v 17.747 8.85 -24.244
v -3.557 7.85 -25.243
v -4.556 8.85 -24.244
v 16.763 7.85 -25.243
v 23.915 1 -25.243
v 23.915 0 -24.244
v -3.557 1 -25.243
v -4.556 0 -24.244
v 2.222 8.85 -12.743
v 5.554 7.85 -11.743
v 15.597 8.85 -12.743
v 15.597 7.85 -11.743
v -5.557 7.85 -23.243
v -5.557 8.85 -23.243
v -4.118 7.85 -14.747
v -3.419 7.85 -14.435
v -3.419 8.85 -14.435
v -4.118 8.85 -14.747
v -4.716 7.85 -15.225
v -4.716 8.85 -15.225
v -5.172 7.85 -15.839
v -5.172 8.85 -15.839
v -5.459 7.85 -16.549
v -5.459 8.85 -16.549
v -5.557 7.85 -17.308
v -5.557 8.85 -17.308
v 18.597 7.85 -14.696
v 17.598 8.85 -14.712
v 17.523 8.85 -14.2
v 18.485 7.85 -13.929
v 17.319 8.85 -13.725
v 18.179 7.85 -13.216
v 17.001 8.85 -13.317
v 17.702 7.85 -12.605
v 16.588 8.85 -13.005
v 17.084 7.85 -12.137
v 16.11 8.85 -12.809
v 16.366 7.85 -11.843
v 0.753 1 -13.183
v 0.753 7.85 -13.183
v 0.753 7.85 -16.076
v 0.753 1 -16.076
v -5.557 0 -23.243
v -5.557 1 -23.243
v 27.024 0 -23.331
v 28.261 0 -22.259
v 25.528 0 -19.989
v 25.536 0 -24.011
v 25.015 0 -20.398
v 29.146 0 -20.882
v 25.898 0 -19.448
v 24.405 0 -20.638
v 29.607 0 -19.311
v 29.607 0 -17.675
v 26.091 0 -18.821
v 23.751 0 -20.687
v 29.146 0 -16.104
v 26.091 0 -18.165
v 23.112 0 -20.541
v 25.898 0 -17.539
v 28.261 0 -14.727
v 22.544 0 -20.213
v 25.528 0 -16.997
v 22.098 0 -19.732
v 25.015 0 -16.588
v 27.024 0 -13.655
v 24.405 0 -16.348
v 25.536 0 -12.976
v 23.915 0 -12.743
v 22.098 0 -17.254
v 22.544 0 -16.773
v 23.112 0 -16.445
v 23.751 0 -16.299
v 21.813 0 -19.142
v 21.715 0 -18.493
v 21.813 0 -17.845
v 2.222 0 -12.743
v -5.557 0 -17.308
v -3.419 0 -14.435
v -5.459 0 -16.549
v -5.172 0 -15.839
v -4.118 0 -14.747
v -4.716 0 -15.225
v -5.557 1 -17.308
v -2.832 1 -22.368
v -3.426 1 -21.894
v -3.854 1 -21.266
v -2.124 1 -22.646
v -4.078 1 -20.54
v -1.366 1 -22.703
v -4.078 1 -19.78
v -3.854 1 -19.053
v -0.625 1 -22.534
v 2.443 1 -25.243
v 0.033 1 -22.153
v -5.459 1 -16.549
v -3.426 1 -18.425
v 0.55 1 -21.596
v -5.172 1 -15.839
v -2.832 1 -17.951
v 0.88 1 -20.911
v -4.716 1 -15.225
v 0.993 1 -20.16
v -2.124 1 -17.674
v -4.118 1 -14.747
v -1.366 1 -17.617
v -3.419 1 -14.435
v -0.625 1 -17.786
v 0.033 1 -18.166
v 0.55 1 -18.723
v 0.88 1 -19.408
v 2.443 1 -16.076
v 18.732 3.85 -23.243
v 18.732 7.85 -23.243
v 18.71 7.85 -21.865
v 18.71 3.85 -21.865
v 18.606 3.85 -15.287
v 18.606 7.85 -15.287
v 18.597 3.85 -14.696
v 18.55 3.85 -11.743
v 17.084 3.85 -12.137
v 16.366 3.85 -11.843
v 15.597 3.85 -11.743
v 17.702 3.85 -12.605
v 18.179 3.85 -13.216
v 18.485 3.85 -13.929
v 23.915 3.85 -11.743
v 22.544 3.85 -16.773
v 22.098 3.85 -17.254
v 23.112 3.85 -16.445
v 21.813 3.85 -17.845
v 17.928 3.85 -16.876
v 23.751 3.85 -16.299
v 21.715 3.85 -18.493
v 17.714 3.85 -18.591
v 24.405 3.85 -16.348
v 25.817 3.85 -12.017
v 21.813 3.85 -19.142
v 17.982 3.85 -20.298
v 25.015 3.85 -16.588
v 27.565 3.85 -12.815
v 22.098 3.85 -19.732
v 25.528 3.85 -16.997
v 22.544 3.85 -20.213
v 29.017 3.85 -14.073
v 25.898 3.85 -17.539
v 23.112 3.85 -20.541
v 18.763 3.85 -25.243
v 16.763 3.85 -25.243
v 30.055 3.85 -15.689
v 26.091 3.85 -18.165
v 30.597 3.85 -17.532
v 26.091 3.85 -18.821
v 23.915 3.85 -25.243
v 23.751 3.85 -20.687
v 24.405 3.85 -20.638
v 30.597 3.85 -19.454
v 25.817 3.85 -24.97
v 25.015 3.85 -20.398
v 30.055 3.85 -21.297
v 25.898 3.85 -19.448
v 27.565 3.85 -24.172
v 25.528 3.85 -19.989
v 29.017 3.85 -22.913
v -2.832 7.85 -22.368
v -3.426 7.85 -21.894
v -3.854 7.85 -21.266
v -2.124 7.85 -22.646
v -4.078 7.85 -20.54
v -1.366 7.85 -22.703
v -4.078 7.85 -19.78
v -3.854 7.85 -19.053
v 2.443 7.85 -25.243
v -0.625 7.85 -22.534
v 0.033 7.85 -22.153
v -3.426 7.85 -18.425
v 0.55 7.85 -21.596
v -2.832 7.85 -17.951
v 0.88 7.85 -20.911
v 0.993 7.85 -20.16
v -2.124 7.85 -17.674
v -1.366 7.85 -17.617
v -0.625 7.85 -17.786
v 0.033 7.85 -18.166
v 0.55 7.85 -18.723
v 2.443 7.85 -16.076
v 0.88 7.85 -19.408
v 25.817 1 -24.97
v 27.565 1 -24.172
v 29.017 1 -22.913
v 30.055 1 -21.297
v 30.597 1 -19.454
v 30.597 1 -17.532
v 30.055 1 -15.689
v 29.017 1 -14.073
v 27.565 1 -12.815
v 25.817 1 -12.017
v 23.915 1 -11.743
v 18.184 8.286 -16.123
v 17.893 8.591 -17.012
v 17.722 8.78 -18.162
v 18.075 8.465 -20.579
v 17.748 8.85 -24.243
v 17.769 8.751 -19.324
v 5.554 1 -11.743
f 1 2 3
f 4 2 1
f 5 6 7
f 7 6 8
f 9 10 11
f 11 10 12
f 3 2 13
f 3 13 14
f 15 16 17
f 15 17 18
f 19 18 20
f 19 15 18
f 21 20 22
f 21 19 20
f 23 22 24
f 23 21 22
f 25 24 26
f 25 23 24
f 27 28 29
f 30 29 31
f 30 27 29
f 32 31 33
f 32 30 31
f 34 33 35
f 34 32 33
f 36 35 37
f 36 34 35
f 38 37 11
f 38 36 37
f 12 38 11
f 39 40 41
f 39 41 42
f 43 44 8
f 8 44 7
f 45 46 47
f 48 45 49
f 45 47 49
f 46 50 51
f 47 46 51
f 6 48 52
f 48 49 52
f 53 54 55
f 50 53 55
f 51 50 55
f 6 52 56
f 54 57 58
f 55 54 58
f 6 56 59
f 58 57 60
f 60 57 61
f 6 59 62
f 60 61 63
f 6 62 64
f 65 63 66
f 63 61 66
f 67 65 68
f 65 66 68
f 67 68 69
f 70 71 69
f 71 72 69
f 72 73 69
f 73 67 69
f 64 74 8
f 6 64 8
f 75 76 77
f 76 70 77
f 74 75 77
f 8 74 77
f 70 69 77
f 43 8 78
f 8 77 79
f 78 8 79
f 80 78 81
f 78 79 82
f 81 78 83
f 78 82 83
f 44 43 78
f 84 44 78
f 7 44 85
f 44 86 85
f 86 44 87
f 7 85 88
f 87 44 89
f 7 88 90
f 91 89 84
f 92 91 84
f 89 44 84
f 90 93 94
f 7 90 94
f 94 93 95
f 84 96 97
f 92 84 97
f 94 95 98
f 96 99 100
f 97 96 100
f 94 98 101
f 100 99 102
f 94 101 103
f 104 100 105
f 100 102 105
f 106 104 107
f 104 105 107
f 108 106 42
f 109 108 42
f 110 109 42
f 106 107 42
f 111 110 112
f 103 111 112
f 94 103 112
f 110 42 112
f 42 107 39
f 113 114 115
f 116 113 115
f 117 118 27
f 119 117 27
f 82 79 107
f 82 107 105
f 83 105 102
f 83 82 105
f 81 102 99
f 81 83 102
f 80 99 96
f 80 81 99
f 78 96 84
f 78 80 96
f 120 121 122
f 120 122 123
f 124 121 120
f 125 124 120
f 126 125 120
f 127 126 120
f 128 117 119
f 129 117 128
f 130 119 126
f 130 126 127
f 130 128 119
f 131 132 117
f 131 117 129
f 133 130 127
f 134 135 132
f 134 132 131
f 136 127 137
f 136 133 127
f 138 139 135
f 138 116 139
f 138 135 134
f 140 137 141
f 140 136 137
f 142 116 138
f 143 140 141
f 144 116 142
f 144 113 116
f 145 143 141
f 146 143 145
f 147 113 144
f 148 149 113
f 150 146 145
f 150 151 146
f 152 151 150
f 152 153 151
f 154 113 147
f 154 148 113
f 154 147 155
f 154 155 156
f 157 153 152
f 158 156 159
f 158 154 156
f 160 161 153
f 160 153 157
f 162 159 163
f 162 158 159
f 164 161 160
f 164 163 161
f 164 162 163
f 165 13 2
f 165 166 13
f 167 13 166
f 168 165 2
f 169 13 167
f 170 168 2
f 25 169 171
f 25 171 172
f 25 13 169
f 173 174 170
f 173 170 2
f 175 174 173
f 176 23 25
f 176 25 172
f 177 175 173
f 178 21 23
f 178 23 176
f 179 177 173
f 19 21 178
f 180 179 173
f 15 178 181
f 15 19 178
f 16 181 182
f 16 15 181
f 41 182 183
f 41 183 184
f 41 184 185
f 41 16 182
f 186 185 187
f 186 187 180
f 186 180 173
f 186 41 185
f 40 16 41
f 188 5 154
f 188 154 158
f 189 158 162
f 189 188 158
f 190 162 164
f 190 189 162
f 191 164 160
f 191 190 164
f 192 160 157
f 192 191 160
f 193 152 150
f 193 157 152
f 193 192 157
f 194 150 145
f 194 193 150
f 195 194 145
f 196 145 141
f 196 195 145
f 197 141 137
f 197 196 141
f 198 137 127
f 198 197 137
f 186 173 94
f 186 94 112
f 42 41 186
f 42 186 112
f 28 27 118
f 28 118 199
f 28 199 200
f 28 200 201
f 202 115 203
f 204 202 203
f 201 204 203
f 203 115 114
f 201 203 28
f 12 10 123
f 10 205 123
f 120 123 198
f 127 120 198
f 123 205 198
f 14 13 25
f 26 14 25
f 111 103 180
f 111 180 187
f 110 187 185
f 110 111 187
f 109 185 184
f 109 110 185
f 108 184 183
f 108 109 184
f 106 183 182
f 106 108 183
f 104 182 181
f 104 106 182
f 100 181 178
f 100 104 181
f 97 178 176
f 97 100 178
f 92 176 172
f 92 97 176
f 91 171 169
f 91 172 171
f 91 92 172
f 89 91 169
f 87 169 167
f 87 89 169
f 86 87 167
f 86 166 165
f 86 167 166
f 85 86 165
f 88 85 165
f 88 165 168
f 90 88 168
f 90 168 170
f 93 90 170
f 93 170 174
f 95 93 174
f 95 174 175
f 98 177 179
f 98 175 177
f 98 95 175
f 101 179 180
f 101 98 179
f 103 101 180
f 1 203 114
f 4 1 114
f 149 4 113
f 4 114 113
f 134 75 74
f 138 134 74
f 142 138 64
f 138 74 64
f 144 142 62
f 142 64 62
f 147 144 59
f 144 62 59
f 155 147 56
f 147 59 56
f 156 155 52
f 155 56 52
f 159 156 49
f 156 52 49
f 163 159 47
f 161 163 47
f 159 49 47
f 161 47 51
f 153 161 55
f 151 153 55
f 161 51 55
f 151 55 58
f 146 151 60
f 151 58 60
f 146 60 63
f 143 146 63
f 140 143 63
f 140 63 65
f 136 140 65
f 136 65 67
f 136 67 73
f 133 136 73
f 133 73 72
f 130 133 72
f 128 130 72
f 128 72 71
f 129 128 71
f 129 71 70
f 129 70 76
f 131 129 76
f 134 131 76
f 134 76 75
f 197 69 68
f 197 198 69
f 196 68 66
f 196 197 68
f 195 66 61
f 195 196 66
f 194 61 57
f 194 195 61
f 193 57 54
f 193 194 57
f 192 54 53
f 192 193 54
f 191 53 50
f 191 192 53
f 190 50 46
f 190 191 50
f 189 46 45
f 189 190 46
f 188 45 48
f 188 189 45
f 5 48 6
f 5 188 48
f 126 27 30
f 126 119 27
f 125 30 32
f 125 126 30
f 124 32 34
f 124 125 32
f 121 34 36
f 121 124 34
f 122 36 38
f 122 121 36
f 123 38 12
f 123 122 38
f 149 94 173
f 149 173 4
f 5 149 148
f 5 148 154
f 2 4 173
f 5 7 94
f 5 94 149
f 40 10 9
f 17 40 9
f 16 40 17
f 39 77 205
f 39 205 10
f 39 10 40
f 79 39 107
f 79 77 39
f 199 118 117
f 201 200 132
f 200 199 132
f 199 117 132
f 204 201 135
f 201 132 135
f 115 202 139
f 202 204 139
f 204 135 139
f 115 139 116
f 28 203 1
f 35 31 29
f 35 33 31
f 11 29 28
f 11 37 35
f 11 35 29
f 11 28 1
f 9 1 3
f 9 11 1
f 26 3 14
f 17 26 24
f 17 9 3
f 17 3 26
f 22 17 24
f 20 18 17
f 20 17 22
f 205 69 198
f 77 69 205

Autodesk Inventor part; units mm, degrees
ref_plane "YZ Plane" through (0, 0, 0) normal (1, 0, 0) x (0, 1, 0)
ref_plane "XZ Plane" through (0, 0, 0) normal (0, 1, 0) x (-1, 0, 0)
ref_plane "XY Plane" through (0, 0, 0) normal (0, 0, 1) x (1, 0, 0)
sketch "Sketch2" plane through (0, 0, 0) normal (0, 1, 0) x (-1, 0, 0)
  line L0 (-5.5536, -11.7431) -> (5.5568, -15.0764)
  line L1 (5.5568, -25.2431) -> (-23.9154, -25.2431)
  line L2 (-23.9154, -25.2431) -> (-23.9154, -11.7431)
  line L3 (-5.5536, -11.7431) -> (-23.9154, -11.7431)
  line L4 (5.5568, -25.2431) -> (5.5568, -15.0764)
  circle A0 centre (-23.9154, -18.4931) radius 6.75
  circle A1 centre (-23.9154, -18.4931) radius 2.2
  circle A2 centre (-23.9154, -18.4931) radius 6.202
  circle A3 centre (-24.9154, -18.9931) radius 6.25
  line L5 (-18.8553, -31.0955) -> (-18.419, -3.4058)
  point P0 (0, 0)
  point P1 (0, 0)
  point P2 (-19.4912, -10.8803)
  point P3 (-19.4912, -24.3803)
  point P4 (-23.9154, -12.2912)
  point P5 (-23.9154, -24.6951)
  dimension "d1" = 13.5
  dimension "d0" = 4.4
  dimension "d6" = 0.5
  dimension "d7" = 1
  dimension "d8" = 12.5
extrude "Extrusion1" add sketch "Sketch2" along normal blind 3.85 contours L0 L4 L1 L5 A0 L3 | L5 A0 L3 | A0 L5 A2 L2 | L2 A2 A3 A0 | A0 L5 A2 | L1 A0 L5 | A2 L5 A3 L2 | L2 A3 A2 | A3 A2 L2 A0 | L5 A2 A3 | A2 L5 | A0 A3 L2 | L2 A3 A2 L5 A0 | A3 A2 L2 A1 | L2 A1 A2 A3 | L2 A2 A3
extrude "Extrusion2" add sketch "Sketch2" along normal blind 8.85 contours L0 L4 L1 L5 A0 L3 | L5 A0 L3 | A0 L5 A2 L2 | A0 L5 A2 | L1 A0 L5 | L2 A3 A2 L5 A0 | L2 A2 A3 picked at (-23.6214, -24.9369)
sketch "Sketch3" plane through (0, 8.85, 0) normal (0, 1, 0) x (1, 0, 0)
  line L0 (-5.5568, 25.2431) -> (-5.5568, 15.0764) projected
  line L1 (-5.5568, 15.0764) -> (5.5536, 11.7431) projected
  line L2 (5.5536, 11.7431) -> (23.9154, 11.7431) projected
  line L3 (23.9154, 11.7431) -> (23.9154, 12.2912) projected
  arc A0 (23.9154, 24.6951) -> (23.9154, 12.2912) centre (23.9154, 18.4931) ccw projected
  line L4 (23.9154, 24.6951) -> (23.9154, 25.2431) projected
  line L5 (23.9154, 25.2431) -> (-5.5568, 25.2431) projected
  line L6 (18.8553, 31.0955) -> (18.419, 3.4058) projected
  point P0 (0, 0)
  point P1 (18.6062, 15.2873)
  point P2 (18.5504, 11.7431)
  point P3 (18.7631, 25.2431)
  point P4 (18.7099, 21.8646)
extrude "Extrusion3" cut sketch "Sketch3" against normal up to surface (5 mm away) contours L5 L4 A0 L6 | L6 A0 L3 L2
sketch "Sketch4" plane through (-5.5568, 0, -25.2431) normal (-1, 0, 0) x (0, 0, 1)
  line L0 (0, 0) -> (10.1667, 0) projected
  line L1 (10.1667, 0) -> (10.1667, 8.85) projected
  line L2 (0, 8.85) -> (10.1667, 8.85) projected
  line L3 (0, 0) -> (0, 8.85) projected
  line L4 (9.1667, 7.85) -> (9.1667, 1)
  line L5 (9.1667, 1) -> (1, 1)
  line L6 (1, 1) -> (1, 7.85)
  line L7 (1, 7.85) -> (9.1667, 7.85)
  point P0 (25.2431, 0)
  dimension "d11" = 1
extrude "Extrusion4" cut sketch "Sketch4" against normal blind 8 contours L4 L5 L6 L7
sketch "Sketch5" plane through (-5.5568, 1, -16.0764) normal (0, 1, 0) x (1, 0, 0)
  line L0 (0, 0) -> (0, 8.1667) projected
  line L1 (0, 0) -> (8, 0) projected
  line L2 (8, 0) -> (8, 8.1667) projected
  line L3 (0, 8.1667) -> (8, 8.1667) projected
  line L4 (8, 4.0834) -> (2.9855, 4.0834) construction
  line L5 (4, 0) -> (4, 4.0834) construction
  circle A0 centre (4, 4.0834) radius 2.55
  point P0 (5.5568, -16.0764)
  dimension "d14" = 5.1
extrude "Extrusion5" add sketch "Sketch5" along normal up to surface (6.85 mm away) contours A0
sketch "Sketch6" plane through (5.5536, 0, -11.7431) normal (0, 0, 1) x (1, 0, 0)
  line L0 (-11.1104, 7.85) -> (-11.1104, 1) projected
  line L1 (-11.1104, 7.85) -> (-4.8007, 7.85)
  line L2 (-4.8007, 7.85) -> (-4.8007, 1)
  line L3 (-11.1104, 1) -> (-4.8007, 1)
  point P0 (-5.5536, 0)
extrude "Extrusion6" cut sketch "Sketch6" against normal up to surface (4.3333 mm away)
sketch "Sketch7" plane through (-5.5568, 1, -24.2431) normal (0, 0, 1) x (1, 0, 0)
  line L0 (0, 0) -> (0, 6.85) projected
  line L1 (0, 0) -> (8, 0) projected
  line L2 (8, 0) -> (8, 6.85) projected
  line L3 (0, 6.85) -> (8, 6.85) projected
  point P0 (5.5568, -1)
extrude "Extrusion7" cut sketch "Sketch7" against normal blind 10.25
sketch "Sketch8" plane through (0, 8.85, 0) normal (0, 1, 0) x (1, 0, 0)
  circle A0 centre (-1.5568, 20.1598) radius 2.55 projected
  circle A1 centre (-1.5568, 20.1598) radius 2.55 projected
  line L0 (-5.5568, 25.2431) -> (2.4432, 25.2431) projected
  point P0 (0, 0)
fillet "Fillet1" radius 3 2 edges at (-5.5568, 8.35, -15.0764) (-5.5568, 0.5, -15.0764)
chamfer "Chamfer1" distance 2 angle 45 2 edges at (-5.5568, 8.35, -25.2431) (-5.5568, 0.5, -25.2431)
chamfer "Chamfer2" distance 2 angle 45 1 edges at (18.7631, 6.35, -25.2431)
fillet "Fillet2" radius 3 1 edges at (18.5504, 6.35, -11.7431)
chamfer "Chamfer3" distance 1 angle 45 7 edges at (6.6031, 8.85, -25.2431) (10.5754, 8.85, -11.7431) (17.7018, 8.85, -12.6052) (18.6016, 8.85, -14.9916) (14.7345, 0, -11.7431) (30.6654, 0, -18.4931) (10.1793, 0, -25.2431)
properties part number "Upper Leg"
